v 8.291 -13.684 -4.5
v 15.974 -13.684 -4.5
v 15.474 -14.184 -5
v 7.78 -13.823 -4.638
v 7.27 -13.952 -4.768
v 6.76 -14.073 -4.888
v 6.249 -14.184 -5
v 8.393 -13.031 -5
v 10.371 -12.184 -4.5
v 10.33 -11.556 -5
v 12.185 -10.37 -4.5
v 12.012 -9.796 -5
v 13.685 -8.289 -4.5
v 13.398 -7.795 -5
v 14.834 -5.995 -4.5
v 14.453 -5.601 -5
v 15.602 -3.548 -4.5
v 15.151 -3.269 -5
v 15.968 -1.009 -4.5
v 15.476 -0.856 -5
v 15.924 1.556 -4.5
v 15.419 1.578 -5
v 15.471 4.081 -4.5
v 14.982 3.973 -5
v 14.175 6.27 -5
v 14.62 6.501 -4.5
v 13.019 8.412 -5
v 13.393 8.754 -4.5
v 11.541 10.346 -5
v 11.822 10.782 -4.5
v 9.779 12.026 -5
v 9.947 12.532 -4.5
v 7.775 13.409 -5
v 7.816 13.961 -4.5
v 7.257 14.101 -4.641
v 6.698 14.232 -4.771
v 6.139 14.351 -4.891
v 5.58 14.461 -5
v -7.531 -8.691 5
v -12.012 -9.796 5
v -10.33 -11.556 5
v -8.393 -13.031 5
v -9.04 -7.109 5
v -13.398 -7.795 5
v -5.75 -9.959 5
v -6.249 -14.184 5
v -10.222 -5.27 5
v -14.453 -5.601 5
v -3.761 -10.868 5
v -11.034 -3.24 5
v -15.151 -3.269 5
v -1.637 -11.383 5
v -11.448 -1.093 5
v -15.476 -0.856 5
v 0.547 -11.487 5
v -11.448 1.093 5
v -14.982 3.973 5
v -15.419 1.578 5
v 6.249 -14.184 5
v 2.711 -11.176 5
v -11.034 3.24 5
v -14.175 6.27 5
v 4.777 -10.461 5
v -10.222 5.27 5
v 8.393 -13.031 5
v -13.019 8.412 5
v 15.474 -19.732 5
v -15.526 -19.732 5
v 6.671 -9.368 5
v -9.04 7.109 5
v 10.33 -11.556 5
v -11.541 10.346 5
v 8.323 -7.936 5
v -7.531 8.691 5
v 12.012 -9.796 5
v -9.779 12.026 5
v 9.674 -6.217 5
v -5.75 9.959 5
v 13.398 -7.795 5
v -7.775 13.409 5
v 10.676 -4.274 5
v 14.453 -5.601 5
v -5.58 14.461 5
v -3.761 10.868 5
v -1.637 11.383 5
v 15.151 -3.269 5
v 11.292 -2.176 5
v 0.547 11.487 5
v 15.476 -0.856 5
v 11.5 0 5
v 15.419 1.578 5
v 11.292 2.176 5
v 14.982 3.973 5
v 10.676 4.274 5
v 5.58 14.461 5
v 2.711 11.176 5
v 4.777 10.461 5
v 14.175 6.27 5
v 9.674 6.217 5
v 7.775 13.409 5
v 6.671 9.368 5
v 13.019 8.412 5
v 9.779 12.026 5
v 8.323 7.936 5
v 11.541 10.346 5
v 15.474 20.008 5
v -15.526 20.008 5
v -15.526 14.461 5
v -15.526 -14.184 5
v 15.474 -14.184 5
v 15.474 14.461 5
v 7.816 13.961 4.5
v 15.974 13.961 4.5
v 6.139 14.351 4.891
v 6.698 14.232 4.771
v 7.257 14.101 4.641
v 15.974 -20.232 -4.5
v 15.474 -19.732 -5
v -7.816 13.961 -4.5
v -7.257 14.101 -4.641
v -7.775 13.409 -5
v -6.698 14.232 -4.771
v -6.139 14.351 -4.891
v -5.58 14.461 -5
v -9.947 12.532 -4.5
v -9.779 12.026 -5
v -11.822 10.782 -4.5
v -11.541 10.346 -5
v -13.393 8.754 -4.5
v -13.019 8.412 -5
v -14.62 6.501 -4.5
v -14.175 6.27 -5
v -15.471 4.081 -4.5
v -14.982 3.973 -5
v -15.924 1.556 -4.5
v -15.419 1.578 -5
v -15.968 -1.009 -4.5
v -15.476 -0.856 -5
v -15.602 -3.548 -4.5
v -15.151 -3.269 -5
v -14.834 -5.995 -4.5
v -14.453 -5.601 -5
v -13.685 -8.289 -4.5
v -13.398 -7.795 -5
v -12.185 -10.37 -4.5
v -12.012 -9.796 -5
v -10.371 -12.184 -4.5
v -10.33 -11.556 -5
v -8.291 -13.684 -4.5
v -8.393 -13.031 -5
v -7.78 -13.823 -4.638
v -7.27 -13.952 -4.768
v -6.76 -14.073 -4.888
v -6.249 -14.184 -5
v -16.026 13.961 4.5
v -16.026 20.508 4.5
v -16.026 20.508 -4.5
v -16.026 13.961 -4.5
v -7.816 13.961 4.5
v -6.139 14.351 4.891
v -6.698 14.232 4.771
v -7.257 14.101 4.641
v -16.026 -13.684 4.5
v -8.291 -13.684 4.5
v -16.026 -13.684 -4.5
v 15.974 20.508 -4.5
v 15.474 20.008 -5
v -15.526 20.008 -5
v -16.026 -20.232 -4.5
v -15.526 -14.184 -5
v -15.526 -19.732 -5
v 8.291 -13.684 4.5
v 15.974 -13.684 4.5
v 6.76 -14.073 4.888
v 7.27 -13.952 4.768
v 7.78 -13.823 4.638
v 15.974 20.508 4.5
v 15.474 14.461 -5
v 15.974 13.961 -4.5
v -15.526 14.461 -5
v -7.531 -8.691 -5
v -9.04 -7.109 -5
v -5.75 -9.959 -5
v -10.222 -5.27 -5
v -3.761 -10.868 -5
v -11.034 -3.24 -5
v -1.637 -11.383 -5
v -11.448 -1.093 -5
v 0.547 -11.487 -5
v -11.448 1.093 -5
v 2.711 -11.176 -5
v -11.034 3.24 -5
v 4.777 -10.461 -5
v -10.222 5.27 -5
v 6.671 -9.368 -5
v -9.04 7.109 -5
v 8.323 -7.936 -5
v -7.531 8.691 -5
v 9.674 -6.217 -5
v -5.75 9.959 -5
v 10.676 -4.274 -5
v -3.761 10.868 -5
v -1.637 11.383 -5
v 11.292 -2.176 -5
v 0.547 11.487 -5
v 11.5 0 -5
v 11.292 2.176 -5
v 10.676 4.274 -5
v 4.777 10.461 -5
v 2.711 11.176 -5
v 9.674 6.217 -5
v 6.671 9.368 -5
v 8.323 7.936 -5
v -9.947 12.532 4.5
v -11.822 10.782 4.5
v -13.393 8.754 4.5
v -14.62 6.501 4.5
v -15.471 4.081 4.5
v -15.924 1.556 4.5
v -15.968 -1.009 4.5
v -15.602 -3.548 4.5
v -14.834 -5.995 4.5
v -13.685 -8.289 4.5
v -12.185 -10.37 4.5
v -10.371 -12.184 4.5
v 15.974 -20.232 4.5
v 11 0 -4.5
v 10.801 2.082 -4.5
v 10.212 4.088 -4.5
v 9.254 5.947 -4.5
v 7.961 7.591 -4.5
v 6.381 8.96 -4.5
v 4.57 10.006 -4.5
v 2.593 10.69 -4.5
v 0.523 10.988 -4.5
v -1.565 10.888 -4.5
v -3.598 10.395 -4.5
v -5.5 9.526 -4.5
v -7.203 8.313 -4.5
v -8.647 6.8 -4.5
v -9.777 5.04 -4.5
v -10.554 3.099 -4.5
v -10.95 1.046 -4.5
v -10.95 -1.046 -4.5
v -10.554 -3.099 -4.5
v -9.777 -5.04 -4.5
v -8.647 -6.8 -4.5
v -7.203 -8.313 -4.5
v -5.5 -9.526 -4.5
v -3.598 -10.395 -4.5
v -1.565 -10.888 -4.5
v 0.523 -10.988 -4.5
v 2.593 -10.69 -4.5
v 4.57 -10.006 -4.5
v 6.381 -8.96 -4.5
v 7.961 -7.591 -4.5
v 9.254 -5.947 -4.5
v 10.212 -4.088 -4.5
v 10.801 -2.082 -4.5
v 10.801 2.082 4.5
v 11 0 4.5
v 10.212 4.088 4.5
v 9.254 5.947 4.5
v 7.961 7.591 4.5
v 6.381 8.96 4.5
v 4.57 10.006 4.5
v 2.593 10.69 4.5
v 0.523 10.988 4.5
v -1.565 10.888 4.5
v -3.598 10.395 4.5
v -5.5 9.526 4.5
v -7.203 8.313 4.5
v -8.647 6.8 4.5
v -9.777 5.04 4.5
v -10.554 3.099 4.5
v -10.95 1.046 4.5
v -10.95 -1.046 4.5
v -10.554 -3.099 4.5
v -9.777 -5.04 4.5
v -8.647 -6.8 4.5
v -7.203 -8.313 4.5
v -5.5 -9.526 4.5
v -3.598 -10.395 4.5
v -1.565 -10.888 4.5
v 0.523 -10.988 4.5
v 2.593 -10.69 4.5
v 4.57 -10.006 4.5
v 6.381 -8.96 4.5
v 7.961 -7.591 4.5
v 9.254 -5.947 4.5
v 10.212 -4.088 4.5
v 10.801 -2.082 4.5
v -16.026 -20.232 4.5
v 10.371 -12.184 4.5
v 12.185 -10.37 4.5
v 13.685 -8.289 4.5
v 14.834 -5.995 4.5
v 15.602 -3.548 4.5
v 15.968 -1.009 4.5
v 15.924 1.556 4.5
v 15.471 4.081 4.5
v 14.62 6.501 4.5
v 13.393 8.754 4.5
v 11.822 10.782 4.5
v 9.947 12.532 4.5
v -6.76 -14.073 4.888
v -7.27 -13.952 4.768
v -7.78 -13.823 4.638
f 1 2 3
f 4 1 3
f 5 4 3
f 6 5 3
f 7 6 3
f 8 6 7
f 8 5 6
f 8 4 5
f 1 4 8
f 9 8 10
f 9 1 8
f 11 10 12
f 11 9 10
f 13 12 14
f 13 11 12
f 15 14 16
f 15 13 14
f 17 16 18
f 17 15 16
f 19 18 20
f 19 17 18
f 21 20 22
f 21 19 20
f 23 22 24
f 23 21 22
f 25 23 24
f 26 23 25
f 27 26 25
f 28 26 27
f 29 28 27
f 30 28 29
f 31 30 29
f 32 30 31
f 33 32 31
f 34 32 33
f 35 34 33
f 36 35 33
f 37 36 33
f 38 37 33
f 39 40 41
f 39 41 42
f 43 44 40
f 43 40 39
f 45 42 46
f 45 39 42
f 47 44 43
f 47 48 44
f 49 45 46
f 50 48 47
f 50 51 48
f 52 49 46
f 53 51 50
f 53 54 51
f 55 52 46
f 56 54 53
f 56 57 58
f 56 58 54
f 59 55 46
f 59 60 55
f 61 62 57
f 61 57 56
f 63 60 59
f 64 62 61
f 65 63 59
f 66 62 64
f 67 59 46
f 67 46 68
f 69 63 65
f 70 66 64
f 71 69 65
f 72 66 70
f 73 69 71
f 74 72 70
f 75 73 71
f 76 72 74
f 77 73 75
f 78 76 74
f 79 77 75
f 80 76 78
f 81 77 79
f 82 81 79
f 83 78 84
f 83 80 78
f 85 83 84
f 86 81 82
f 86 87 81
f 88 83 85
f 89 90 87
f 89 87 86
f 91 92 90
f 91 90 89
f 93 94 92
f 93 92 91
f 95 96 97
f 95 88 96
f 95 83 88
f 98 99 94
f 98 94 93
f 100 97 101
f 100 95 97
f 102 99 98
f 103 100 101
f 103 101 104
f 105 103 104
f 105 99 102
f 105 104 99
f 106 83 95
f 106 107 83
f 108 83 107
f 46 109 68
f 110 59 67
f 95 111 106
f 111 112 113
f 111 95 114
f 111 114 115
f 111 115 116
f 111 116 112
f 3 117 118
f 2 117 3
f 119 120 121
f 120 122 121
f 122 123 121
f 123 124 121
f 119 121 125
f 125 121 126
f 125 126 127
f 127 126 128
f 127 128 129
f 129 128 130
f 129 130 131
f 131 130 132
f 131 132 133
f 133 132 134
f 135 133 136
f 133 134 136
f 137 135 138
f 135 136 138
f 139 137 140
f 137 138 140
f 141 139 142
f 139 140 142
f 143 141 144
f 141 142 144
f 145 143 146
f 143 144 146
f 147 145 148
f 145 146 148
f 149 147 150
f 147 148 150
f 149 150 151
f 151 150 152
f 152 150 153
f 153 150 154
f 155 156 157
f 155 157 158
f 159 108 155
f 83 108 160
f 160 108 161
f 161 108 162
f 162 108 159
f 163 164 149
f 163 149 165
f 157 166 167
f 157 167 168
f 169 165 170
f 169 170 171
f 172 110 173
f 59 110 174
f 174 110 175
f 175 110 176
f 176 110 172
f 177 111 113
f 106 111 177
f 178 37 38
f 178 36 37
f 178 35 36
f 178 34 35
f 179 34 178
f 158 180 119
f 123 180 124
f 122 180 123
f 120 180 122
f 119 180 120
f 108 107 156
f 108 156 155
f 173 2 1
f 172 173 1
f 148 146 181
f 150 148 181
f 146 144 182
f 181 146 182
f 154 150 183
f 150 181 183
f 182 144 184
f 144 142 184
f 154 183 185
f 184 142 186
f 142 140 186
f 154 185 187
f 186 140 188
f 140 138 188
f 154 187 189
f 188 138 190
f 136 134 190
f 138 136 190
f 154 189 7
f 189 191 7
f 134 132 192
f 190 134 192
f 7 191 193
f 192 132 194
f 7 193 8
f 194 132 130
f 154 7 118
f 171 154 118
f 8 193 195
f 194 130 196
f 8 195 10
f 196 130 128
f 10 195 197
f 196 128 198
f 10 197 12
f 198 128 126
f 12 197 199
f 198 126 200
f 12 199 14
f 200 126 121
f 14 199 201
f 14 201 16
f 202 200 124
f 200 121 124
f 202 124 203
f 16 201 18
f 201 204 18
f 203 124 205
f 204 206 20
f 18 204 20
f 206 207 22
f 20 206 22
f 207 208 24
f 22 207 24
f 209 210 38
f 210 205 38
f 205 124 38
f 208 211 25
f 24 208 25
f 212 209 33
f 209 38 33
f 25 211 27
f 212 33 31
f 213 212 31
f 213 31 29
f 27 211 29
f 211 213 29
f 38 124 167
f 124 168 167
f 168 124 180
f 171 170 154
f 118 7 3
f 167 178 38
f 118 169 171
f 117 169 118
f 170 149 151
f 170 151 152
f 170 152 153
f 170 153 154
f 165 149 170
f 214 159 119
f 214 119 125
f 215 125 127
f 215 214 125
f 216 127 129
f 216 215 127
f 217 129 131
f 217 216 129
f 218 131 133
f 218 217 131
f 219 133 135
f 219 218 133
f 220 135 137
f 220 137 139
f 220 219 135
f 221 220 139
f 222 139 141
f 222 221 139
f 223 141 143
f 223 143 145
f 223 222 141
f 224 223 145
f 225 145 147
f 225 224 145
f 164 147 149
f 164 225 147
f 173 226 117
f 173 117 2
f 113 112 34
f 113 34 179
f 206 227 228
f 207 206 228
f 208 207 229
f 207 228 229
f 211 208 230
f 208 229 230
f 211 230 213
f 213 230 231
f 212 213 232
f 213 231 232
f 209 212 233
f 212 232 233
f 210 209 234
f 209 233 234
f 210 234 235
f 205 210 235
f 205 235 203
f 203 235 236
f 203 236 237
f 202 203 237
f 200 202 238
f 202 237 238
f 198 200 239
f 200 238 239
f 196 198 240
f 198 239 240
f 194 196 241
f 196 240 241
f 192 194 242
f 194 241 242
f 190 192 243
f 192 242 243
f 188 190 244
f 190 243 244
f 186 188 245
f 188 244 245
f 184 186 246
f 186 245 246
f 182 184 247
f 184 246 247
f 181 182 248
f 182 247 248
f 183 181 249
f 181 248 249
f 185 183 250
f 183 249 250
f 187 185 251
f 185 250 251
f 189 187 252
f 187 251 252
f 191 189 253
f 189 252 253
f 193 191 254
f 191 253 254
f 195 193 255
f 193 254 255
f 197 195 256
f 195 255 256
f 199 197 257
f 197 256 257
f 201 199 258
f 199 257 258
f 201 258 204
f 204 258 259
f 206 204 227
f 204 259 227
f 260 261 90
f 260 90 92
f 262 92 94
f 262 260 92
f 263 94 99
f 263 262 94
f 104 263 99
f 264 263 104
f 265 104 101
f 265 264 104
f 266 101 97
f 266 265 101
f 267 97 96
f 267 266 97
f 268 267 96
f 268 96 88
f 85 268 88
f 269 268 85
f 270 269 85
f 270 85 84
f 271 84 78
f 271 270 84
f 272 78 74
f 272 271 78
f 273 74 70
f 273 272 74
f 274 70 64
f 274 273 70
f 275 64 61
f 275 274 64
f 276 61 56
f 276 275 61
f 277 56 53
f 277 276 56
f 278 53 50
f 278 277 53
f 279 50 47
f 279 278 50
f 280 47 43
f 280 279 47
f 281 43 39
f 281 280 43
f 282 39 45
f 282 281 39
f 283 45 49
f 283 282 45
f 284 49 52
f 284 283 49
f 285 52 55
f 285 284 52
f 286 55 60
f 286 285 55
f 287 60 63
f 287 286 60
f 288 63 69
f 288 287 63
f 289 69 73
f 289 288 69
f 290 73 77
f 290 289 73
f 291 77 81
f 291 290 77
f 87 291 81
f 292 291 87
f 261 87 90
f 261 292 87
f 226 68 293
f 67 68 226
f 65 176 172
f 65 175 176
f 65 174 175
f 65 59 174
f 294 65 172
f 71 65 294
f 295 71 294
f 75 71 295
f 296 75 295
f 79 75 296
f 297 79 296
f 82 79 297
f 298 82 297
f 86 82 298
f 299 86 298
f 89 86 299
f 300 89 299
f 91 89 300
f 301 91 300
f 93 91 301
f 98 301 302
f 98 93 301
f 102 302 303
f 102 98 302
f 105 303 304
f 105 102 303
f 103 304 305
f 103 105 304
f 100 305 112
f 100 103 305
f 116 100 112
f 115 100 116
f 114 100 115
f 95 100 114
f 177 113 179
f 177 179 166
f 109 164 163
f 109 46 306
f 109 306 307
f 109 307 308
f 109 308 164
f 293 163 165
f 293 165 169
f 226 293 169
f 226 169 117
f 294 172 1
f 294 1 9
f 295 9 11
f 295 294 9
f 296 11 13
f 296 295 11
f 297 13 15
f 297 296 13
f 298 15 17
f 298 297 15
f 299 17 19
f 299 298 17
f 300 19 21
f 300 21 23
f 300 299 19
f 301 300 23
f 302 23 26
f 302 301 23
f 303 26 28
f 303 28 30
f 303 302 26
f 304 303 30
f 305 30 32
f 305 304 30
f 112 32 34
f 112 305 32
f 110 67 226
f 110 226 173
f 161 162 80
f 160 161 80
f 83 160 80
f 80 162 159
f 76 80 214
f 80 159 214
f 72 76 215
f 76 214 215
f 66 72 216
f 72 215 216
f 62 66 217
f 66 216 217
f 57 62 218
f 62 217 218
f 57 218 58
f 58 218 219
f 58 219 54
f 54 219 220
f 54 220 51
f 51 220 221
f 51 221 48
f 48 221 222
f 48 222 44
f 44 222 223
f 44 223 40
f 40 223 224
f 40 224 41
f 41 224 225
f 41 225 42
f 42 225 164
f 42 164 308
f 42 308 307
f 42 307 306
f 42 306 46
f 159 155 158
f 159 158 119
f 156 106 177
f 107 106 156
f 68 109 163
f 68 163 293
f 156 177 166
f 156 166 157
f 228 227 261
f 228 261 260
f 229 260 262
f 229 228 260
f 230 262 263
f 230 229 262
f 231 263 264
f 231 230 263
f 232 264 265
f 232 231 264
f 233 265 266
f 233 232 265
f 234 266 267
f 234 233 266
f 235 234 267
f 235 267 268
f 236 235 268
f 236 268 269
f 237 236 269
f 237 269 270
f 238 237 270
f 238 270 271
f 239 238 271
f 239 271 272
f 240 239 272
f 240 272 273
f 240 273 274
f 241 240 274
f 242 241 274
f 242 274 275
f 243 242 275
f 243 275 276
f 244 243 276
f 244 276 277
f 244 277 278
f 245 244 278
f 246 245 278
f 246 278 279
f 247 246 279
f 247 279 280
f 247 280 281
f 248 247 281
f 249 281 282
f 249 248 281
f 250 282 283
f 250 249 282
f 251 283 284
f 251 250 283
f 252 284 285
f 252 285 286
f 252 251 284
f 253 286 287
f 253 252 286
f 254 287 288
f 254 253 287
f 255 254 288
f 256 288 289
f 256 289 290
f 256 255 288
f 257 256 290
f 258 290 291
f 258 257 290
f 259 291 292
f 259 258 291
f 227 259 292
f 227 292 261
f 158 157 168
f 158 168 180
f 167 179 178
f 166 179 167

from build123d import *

# Parameters (mm, degrees)
F0_R     = 11
F1_DEPTH = 5
F2_SIZE2 = 0.5
F2_SIZE  = 0.5
F3_SIZE2 = 0.5
F3_SIZE  = 0.5


with BuildPart() as f1:
    # F0 (on Top) → F1 (new body, symmetric)
    with BuildSketch(Plane.XY):
        with BuildLine():
            Line((-16.026402, 13.960794), (-7.816408, 13.960794))
            ThreePointArc((-7.816408, 13.960794), (-15.997645, 0.274512), (-8.290786, -13.684402))
            Line((-8.290786, -13.684402), (-16.026402, -13.684402))
            Line((-16.026402, -13.684402), (-16.026402, -20.231948))
            Line((-16.026402, -20.231948), (15.973598, -20.231948))
            Line((15.973598, -20.231948), (15.973598, -13.684402))
            Line((15.973598, -13.684402), (8.290786, -13.684402))
            ThreePointArc((8.290786, -13.684402), (15.997645, 0.274512), (7.816408, 13.960794))
            Line((7.816408, 13.960794), (15.973598, 13.960794))
            Line((15.973598, 13.960794), (15.973598, 20.50834))
            Line((15.973598, 20.50834), (-16.026402, 20.50834))
            Line((-16.026402, 20.50834), (-16.026402, 13.960794))
        make_face()
        Circle(F0_R, mode=Mode.SUBTRACT)
    extrude(amount=F1_DEPTH, both=True)

    # F2
    f2_edges = [f1.edges().sort_by_distance(p)[0] for p in [
        (15.973598, 17.234567, 5),
        (-0.026402, 20.50834, 5),
        (-16.026402, 17.234567, 5),
        (-11.921405, 13.960794, 5),
        (-15.997645, 0.274512, 5),
        (-12.158594, -13.684402, 5),
        (-16.026402, -16.958175, 5),
        (-0.026402, -20.231948, 5),
        (15.973598, -16.958175, 5),
        (12.132192, -13.684402, 5),
        (15.997645, 0.274512, 5),
        (11.895003, 13.960794, 5),
        (-11, 0, 5),
    ]]
    chamfer(f2_edges, length=F2_SIZE, length2=F2_SIZE2)

    # F3
    f3_edges = [f1.edges().sort_by_distance(p)[0] for p in [
        (15.973598, 17.234567, -5),
        (-0.026402, 20.50834, -5),
        (-16.026402, 17.234567, -5),
        (-11.921405, 13.960794, -5),
        (-15.997645, 0.274512, -5),
        (-12.158594, -13.684402, -5),
        (-16.026402, -16.958175, -5),
        (-0.026402, -20.231948, -5),
        (15.973598, -16.958175, -5),
        (12.132192, -13.684402, -5),
        (15.997645, 0.274512, -5),
        (11.895003, 13.960794, -5),
        (-11, 0, -5),
    ]]
    chamfer(f3_edges, length=F3_SIZE, length2=F3_SIZE2)


solid = f1.part
